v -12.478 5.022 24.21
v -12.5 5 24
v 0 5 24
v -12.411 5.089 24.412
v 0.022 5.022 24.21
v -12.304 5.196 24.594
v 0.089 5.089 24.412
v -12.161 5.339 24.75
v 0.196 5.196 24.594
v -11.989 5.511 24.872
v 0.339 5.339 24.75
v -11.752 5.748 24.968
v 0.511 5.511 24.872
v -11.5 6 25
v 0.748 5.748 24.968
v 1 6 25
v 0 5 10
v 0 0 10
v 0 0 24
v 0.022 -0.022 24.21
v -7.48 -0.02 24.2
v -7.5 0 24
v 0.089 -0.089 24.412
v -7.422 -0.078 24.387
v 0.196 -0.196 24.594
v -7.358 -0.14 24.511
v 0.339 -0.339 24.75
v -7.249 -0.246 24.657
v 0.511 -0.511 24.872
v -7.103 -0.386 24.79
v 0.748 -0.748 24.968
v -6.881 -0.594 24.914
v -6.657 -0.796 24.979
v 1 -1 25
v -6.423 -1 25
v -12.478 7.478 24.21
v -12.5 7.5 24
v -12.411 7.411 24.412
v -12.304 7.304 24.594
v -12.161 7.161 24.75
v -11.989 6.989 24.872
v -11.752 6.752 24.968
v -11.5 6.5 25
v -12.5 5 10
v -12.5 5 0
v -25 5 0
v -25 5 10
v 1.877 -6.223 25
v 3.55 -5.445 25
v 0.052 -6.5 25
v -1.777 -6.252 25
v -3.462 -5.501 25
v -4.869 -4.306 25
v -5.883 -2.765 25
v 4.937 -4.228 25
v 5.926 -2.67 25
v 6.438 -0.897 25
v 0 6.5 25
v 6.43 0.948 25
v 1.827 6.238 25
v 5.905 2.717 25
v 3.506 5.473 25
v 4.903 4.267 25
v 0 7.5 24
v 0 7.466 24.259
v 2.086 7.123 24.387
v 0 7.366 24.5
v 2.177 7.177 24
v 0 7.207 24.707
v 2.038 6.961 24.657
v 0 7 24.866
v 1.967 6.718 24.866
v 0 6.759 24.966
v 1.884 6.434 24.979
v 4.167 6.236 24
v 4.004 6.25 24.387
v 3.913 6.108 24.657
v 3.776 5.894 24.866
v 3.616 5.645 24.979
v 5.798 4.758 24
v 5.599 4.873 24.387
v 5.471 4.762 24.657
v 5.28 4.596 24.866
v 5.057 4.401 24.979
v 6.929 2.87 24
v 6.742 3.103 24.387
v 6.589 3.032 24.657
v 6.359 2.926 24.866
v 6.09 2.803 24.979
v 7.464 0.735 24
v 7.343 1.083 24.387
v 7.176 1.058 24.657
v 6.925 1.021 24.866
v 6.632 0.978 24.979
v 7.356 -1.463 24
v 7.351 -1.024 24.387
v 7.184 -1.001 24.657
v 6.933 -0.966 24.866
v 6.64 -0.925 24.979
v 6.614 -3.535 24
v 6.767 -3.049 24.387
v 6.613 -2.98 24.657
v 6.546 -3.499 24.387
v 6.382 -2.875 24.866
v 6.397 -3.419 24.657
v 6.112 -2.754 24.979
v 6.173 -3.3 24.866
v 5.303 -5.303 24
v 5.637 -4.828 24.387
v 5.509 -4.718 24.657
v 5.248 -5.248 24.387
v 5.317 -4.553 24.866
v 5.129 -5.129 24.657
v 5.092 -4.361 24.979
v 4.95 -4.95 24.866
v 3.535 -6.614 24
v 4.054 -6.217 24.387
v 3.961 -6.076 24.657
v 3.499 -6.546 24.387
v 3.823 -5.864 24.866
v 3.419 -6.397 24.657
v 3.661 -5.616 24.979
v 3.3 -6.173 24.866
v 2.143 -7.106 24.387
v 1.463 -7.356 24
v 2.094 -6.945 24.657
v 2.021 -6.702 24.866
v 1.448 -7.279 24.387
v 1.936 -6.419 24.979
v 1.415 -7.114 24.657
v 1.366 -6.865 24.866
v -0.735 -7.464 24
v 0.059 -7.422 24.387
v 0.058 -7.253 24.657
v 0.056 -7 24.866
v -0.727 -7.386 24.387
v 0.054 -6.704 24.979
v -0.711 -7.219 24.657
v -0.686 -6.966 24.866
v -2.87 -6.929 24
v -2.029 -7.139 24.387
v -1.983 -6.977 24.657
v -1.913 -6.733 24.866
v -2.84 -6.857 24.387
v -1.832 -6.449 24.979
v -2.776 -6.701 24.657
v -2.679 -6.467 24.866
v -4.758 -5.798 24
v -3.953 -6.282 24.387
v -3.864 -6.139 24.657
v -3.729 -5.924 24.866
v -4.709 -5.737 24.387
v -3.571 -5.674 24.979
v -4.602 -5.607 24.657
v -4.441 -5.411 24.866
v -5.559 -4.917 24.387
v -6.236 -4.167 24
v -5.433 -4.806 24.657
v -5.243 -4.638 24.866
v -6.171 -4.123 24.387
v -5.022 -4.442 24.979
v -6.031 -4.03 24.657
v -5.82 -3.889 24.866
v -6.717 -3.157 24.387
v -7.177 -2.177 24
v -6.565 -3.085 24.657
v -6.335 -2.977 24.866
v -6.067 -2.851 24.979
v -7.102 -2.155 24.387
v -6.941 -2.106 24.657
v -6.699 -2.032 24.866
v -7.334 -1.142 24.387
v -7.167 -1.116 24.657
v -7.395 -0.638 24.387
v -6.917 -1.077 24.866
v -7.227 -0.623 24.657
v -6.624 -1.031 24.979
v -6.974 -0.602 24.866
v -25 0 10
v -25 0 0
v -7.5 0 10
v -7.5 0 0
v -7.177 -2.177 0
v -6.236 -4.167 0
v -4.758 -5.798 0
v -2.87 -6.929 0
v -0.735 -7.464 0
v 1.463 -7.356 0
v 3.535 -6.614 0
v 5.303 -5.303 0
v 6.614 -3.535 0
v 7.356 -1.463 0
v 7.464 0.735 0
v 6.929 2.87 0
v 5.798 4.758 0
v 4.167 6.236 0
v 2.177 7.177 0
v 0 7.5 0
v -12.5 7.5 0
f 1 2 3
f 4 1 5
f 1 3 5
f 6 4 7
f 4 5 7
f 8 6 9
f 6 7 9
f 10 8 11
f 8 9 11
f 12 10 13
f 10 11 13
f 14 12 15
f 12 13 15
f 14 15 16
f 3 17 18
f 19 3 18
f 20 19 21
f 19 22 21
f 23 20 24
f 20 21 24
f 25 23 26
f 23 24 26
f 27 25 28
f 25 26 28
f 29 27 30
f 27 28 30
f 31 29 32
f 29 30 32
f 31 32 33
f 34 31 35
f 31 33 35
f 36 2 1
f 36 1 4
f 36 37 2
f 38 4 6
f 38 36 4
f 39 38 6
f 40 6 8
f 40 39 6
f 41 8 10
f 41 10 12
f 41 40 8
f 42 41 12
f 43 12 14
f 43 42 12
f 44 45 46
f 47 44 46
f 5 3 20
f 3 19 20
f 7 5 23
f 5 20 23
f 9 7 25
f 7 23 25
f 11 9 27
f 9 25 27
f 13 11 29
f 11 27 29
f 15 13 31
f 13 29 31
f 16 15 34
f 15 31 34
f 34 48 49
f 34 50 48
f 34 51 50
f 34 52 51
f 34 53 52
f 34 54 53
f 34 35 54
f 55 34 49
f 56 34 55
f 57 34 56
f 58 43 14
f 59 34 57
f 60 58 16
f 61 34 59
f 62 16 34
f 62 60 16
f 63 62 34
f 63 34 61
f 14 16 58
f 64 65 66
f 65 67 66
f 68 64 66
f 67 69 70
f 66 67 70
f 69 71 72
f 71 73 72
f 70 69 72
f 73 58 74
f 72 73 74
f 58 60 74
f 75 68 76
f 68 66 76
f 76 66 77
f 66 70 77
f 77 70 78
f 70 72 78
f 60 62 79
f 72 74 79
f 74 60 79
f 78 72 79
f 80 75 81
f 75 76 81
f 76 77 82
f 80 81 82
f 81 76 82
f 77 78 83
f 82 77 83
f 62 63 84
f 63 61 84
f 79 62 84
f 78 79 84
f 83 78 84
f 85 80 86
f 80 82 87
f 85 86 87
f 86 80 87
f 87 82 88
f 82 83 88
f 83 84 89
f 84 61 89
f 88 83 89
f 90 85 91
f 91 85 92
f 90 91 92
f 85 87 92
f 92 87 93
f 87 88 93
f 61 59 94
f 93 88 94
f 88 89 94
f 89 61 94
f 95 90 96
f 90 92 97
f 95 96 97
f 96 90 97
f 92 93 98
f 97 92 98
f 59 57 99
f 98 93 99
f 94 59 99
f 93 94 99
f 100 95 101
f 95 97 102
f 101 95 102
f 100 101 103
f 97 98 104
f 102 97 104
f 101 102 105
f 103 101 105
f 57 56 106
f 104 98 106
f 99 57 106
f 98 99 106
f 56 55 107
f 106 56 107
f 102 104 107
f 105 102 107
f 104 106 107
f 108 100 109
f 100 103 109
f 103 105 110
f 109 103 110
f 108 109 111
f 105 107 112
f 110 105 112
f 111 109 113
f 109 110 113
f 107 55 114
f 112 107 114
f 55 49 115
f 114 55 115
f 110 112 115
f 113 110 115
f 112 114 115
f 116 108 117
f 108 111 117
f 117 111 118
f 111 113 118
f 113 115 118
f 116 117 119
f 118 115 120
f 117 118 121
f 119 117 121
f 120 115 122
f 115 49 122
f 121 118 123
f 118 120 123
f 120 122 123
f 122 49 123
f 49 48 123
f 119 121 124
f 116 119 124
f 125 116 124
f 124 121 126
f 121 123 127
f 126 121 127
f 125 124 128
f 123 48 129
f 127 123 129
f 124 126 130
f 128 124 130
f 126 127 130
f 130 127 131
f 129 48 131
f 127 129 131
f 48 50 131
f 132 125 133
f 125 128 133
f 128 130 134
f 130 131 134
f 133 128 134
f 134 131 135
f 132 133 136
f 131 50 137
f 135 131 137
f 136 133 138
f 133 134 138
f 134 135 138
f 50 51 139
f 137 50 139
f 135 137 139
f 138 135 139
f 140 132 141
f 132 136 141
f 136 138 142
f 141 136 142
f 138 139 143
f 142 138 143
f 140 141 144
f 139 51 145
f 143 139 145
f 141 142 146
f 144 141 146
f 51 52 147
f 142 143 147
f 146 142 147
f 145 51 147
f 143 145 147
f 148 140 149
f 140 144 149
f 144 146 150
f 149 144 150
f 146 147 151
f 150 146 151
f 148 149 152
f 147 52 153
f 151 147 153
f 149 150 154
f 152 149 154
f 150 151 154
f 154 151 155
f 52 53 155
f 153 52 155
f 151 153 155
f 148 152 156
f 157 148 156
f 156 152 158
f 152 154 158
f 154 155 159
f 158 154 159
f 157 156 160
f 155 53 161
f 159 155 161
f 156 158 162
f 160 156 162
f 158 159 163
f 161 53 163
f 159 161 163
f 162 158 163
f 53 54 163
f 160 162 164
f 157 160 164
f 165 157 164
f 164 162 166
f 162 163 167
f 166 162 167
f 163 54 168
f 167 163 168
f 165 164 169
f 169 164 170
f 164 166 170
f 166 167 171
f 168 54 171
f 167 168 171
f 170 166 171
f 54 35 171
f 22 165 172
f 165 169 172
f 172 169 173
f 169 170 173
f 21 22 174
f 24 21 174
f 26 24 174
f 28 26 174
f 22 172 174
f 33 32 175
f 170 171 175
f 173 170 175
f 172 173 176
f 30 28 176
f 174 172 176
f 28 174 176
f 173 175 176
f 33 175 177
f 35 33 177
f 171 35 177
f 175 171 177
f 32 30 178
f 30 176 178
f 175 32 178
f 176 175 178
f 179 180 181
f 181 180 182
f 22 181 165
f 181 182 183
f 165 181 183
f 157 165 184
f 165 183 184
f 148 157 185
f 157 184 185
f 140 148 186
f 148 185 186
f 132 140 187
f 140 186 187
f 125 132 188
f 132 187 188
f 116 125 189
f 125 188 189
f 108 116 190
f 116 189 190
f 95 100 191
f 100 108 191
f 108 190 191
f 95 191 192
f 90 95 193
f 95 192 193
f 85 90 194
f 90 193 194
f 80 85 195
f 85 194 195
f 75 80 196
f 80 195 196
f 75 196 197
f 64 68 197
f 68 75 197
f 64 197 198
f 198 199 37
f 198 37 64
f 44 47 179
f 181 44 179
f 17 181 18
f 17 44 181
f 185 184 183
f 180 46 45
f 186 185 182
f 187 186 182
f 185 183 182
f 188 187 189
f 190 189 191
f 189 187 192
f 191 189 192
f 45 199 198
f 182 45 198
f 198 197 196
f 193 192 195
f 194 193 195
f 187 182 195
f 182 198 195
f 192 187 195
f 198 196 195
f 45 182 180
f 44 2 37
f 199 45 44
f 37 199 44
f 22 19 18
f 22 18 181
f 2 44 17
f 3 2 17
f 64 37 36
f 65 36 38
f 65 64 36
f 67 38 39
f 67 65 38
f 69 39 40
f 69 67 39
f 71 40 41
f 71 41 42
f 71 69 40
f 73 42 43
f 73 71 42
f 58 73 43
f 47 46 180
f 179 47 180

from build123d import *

# Parameters (mm, degrees)
F0_W     = 12.5
F0_H     = 2.5
F1_DEPTH = 25
F2_R     = 1
F3_DEPTH = 10


with BuildPart() as f1:
    # F0 (on Top) → F1 (new body)
    with BuildSketch(Plane.XY):
        with BuildLine():
            Line((0, 7.5), (0, 5))
            Line((0, 5), (0, 0))
            Line((0, 0), (-7.5, 0))
            ThreePointArc((-7.5, 0), (0, -7.5), (7.5, 0))
            ThreePointArc((7.5, 0), (5.3033008589, 5.3033008589), (0, 7.5))
        make_face()
        with Locations((-6.25, 6.25)):
            Rectangle(F0_W, F0_H)
    extrude(amount=F1_DEPTH)

    # F2
    f2_edges = [f1.edges().sort_by_distance(p)[0] for p in [
        (-6.25, 7.5, 25),
        (-12.5, 6.25, 25),
        (-6.25, 5, 25),
        (0, 2.5, 25),
        (-3.75, 0, 25),
        (5.303301, -5.303301, 25),
    ]]
    fillet(f2_edges, radius=F2_R)

    # F0 (on Top) → F3 (join)
    with BuildSketch(Plane.XY):
        Polygon((0, 5), (-12.5, 5), (-12.5, 0), (-7.5, 0), (0, 0), align=None)
        with BuildLine():
            Line((-12.5, 0), (-12.5, 5))
            ThreePointArc((-12.5, 5), (-16.0355339059, 3.5355339059), (-17.5, 0))
            Line((-17.5, 0), (-12.5, 0))
        make_face()
        with BuildLine():
            ThreePointArc((-17.5, 0), (-16.0355339059, 3.5355339059), (-12.5, 5))
            Line((-12.5, 5), (-25, 5))
            Line((-25, 5), (-25, 0))
            Line((-25, 0), (-17.5, 0))
        make_face()
    extrude(amount=F3_DEPTH)


solid = f1.part
